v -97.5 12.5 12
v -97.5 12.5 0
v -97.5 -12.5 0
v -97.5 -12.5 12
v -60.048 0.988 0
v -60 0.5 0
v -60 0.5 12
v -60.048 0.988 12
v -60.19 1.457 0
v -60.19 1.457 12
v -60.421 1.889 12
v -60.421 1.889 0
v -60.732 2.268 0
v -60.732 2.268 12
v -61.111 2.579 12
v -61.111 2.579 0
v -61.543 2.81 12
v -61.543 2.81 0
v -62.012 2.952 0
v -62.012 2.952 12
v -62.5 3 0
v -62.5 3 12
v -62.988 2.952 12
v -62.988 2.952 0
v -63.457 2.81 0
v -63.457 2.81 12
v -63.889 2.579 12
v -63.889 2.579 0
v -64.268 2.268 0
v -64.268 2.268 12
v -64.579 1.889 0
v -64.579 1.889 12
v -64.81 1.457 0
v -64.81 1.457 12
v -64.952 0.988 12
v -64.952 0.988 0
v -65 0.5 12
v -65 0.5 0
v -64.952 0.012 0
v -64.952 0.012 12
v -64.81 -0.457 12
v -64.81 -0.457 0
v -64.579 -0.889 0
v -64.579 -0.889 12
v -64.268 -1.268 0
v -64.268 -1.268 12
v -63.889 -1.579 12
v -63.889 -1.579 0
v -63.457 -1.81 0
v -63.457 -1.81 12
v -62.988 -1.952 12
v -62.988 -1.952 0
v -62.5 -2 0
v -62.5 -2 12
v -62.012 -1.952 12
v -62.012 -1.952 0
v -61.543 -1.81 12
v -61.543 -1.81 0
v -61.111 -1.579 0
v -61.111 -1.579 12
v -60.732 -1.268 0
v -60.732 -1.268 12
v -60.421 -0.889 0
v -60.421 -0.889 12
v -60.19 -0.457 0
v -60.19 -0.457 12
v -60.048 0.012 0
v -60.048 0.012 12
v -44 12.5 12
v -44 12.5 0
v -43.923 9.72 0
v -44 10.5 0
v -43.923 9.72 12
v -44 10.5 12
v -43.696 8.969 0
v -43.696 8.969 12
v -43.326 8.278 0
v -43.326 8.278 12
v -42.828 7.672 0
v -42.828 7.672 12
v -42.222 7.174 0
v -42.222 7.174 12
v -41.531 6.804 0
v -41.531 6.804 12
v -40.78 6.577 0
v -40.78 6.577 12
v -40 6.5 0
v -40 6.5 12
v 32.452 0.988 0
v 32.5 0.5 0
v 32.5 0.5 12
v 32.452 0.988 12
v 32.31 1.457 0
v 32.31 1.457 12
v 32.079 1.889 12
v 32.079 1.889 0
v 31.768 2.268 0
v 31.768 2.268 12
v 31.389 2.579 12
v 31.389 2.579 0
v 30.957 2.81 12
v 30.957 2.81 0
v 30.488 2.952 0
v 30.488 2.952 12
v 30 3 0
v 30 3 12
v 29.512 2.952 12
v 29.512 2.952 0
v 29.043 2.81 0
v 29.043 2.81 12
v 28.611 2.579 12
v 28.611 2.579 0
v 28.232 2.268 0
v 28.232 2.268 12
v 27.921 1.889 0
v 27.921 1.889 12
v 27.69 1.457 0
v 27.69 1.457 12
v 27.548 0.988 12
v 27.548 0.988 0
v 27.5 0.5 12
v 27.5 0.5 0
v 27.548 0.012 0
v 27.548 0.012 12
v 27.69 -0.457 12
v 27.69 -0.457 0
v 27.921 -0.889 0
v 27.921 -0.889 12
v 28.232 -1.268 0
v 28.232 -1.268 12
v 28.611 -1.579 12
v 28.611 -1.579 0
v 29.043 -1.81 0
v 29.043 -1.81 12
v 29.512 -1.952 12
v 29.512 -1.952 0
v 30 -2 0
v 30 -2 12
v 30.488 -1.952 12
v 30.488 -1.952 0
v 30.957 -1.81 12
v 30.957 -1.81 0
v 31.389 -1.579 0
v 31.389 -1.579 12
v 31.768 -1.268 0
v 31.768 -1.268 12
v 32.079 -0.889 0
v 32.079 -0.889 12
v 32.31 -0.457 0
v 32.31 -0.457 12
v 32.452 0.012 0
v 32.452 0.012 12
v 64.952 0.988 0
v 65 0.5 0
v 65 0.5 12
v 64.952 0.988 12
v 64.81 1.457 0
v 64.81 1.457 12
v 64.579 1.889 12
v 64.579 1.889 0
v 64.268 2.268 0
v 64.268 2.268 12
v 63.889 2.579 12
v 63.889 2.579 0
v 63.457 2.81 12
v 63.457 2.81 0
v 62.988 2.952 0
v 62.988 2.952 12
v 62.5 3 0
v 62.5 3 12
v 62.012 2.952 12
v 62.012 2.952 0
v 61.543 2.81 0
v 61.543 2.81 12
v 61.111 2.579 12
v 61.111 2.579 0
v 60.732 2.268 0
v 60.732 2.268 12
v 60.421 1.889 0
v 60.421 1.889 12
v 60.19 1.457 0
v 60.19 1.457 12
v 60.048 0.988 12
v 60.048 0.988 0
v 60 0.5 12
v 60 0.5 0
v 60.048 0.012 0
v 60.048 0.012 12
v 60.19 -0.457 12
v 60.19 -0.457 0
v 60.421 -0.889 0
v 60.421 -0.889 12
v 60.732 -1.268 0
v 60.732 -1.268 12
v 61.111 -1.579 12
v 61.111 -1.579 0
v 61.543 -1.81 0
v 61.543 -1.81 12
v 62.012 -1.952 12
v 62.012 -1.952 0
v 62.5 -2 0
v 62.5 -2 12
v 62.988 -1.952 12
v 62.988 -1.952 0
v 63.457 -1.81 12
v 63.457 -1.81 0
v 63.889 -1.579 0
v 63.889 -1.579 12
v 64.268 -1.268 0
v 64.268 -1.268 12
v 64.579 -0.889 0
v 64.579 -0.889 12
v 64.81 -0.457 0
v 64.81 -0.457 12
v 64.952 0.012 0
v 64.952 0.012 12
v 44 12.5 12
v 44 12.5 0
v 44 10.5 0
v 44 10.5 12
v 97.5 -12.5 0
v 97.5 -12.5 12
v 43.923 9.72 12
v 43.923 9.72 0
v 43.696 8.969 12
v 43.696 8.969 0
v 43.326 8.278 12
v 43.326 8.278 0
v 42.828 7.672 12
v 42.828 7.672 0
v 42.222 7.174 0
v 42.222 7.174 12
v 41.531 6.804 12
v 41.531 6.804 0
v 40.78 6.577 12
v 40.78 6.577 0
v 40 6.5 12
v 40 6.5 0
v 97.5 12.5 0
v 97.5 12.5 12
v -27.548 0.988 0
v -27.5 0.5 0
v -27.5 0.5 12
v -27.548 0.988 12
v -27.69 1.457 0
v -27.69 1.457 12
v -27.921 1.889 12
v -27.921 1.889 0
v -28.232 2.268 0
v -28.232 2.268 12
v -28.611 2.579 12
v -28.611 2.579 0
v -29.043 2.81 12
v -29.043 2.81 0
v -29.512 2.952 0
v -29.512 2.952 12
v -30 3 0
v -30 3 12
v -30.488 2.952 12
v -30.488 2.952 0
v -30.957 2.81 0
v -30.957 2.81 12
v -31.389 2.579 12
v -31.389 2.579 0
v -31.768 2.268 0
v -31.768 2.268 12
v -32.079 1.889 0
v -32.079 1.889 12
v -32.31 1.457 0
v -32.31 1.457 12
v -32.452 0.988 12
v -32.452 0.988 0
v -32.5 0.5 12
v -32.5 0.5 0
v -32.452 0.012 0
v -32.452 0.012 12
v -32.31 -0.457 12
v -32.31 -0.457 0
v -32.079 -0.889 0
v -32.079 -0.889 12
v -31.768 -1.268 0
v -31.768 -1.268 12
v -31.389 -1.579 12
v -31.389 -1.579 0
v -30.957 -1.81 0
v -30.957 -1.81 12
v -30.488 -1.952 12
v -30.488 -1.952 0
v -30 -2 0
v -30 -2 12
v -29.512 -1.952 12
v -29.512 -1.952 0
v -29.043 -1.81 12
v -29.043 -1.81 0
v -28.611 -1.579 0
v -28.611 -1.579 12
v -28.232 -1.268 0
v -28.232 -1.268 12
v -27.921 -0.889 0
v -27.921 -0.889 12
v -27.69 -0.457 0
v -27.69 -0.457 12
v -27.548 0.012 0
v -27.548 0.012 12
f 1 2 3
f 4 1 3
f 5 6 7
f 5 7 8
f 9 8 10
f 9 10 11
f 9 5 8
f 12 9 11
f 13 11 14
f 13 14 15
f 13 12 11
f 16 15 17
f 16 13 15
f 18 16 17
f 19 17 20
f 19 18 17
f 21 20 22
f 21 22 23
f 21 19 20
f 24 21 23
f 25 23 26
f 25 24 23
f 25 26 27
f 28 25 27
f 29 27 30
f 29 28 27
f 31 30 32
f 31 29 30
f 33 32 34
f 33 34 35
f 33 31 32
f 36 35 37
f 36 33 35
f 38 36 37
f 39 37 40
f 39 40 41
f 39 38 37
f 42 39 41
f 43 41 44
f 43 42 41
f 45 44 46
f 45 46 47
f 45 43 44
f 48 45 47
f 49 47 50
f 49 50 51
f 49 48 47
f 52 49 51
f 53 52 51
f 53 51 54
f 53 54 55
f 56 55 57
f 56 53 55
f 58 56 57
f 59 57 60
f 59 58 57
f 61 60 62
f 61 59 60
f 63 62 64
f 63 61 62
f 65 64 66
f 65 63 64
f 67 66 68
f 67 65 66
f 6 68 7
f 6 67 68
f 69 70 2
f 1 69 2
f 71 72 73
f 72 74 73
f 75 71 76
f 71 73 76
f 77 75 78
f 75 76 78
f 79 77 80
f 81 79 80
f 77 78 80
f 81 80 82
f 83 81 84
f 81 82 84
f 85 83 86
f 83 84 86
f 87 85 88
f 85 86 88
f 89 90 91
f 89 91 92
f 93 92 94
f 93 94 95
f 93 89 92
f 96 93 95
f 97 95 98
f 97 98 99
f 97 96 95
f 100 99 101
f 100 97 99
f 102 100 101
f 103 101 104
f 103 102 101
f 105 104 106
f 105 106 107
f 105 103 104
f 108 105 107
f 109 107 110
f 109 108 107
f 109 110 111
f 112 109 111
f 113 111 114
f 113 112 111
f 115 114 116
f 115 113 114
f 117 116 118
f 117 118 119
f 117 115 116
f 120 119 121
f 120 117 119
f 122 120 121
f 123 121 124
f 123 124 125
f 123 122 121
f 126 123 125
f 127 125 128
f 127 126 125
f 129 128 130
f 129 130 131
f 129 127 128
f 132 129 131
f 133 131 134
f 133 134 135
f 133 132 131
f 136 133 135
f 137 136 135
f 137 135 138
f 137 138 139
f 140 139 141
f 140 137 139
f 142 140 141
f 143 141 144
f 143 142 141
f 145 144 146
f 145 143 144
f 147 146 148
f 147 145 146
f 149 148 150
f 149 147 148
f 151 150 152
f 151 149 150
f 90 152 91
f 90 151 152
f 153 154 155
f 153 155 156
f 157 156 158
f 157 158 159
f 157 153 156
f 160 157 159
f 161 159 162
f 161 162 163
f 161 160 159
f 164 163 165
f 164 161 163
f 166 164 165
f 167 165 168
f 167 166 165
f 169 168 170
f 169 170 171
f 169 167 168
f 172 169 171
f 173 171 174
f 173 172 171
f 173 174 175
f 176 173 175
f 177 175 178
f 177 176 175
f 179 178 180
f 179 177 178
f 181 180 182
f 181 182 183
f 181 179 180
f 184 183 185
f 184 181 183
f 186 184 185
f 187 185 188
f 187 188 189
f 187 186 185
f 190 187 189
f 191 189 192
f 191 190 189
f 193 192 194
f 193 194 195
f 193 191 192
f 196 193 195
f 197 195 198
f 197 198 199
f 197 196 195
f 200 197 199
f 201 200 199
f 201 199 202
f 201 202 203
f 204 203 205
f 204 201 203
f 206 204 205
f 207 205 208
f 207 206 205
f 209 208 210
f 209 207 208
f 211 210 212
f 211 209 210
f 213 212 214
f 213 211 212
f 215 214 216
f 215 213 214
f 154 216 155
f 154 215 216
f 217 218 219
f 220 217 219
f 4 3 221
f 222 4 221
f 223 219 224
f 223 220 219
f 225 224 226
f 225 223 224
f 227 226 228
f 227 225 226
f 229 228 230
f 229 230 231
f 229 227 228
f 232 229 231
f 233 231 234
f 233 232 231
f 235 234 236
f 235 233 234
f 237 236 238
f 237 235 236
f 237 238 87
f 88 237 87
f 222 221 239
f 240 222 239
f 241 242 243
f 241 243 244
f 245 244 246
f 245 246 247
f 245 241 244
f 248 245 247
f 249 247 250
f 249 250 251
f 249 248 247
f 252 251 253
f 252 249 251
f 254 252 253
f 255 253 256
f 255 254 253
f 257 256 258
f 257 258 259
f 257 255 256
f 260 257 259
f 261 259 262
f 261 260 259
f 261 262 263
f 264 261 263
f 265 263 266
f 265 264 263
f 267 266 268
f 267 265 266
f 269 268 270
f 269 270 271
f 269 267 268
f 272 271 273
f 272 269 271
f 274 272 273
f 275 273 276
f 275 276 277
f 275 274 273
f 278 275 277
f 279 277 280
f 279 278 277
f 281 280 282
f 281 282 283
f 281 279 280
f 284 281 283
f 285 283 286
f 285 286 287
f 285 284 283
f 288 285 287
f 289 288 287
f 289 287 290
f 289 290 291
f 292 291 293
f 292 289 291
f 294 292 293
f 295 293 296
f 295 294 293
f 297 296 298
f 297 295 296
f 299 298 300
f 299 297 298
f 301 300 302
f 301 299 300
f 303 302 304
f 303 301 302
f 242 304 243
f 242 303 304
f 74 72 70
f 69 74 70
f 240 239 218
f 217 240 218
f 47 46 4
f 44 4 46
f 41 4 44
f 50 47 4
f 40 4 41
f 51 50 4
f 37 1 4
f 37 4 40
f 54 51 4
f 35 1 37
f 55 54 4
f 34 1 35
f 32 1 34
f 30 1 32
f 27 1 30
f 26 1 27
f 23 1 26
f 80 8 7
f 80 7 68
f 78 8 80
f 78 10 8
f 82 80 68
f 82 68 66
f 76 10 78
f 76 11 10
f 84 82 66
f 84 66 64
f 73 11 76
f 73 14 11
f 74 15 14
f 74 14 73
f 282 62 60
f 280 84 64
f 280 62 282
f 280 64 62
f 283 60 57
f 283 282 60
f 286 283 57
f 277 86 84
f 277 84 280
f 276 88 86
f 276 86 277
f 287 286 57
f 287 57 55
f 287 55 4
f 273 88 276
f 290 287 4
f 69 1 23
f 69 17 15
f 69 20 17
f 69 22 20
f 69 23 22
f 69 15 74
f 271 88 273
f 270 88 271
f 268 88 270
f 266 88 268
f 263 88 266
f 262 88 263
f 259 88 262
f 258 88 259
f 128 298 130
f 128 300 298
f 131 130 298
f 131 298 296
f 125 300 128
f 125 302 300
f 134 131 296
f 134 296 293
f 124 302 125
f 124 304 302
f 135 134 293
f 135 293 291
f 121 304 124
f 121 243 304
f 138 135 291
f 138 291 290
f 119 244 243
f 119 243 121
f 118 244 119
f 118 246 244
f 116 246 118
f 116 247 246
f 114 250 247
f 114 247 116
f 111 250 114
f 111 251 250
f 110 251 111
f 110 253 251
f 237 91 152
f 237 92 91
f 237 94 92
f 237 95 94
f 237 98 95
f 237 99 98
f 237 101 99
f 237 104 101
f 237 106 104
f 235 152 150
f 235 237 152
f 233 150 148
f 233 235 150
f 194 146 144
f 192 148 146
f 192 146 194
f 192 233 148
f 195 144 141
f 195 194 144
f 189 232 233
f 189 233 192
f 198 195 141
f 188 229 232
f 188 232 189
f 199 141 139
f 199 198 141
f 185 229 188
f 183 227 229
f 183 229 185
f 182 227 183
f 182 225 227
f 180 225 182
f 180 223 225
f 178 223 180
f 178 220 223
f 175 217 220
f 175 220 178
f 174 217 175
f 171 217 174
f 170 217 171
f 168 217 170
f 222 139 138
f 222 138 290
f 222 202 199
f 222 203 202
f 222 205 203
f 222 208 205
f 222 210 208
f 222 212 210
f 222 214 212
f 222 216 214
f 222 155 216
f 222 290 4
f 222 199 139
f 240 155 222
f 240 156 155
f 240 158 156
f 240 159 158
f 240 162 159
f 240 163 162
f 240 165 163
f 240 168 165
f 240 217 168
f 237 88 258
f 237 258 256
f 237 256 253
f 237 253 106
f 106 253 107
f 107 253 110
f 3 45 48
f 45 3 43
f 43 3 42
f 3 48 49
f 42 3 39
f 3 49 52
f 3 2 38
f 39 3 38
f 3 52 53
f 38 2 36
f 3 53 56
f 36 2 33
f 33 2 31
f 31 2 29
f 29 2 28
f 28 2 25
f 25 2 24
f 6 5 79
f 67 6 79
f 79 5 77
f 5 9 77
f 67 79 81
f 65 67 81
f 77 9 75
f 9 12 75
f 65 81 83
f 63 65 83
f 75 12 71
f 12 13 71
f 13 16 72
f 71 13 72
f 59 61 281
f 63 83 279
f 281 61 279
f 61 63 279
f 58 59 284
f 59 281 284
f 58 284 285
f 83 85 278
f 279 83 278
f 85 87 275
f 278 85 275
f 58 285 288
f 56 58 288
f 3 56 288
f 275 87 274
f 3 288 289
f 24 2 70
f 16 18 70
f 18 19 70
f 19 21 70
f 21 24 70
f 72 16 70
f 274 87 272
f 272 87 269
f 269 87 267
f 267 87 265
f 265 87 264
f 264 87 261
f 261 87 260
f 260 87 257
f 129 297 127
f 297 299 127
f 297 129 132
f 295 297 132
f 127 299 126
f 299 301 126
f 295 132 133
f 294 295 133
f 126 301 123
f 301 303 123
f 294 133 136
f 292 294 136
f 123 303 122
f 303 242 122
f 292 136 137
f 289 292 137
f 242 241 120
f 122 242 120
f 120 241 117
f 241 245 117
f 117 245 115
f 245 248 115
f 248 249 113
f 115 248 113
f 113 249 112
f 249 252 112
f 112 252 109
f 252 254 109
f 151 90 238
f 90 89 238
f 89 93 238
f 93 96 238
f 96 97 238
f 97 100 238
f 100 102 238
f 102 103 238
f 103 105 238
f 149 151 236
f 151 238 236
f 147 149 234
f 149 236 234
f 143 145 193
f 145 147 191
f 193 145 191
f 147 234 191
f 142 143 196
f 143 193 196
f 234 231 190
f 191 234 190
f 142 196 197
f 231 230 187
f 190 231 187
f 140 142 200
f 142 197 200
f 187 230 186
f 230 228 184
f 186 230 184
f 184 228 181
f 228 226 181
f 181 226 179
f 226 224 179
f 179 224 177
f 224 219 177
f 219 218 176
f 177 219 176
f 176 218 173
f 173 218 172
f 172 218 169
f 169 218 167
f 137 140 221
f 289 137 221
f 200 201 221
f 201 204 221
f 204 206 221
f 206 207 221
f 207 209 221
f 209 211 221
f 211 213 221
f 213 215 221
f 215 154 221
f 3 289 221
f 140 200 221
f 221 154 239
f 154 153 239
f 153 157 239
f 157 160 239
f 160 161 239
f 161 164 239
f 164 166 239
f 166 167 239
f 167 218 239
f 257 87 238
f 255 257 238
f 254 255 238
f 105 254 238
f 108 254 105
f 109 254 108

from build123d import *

# Parameters (mm, degrees)
F0_R     = 2.5
F1_DEPTH = 12
F2_R     = 4


with BuildPart() as f1:
    # F0 (on Top) → F1 (new body)
    with BuildSketch(Plane.XY):
        Polygon((-97.5, -12.5), (97.5, -12.5), (97.5, 12.5), (44, 12.5), (44, 6.5), (-44, 6.5), (-44, 12.5), (-97.5, 12.5), align=None)
        with Locations((-62.5, 0.5)):
            Circle(F0_R, mode=Mode.SUBTRACT)
        with Locations((-30, 0.5)):
            Circle(F0_R, mode=Mode.SUBTRACT)
        with Locations((30, 0.5)):
            Circle(F0_R, mode=Mode.SUBTRACT)
        with Locations((62.5, 0.5)):
            Circle(F0_R, mode=Mode.SUBTRACT)
    extrude(amount=F1_DEPTH)

    # F2
    f2_edges = [f1.edges().sort_by_distance(p)[0] for p in [
        (-44, 6.5, 6),
        (44, 6.5, 6),
    ]]
    fillet(f2_edges, radius=F2_R)


solid = f1.part
